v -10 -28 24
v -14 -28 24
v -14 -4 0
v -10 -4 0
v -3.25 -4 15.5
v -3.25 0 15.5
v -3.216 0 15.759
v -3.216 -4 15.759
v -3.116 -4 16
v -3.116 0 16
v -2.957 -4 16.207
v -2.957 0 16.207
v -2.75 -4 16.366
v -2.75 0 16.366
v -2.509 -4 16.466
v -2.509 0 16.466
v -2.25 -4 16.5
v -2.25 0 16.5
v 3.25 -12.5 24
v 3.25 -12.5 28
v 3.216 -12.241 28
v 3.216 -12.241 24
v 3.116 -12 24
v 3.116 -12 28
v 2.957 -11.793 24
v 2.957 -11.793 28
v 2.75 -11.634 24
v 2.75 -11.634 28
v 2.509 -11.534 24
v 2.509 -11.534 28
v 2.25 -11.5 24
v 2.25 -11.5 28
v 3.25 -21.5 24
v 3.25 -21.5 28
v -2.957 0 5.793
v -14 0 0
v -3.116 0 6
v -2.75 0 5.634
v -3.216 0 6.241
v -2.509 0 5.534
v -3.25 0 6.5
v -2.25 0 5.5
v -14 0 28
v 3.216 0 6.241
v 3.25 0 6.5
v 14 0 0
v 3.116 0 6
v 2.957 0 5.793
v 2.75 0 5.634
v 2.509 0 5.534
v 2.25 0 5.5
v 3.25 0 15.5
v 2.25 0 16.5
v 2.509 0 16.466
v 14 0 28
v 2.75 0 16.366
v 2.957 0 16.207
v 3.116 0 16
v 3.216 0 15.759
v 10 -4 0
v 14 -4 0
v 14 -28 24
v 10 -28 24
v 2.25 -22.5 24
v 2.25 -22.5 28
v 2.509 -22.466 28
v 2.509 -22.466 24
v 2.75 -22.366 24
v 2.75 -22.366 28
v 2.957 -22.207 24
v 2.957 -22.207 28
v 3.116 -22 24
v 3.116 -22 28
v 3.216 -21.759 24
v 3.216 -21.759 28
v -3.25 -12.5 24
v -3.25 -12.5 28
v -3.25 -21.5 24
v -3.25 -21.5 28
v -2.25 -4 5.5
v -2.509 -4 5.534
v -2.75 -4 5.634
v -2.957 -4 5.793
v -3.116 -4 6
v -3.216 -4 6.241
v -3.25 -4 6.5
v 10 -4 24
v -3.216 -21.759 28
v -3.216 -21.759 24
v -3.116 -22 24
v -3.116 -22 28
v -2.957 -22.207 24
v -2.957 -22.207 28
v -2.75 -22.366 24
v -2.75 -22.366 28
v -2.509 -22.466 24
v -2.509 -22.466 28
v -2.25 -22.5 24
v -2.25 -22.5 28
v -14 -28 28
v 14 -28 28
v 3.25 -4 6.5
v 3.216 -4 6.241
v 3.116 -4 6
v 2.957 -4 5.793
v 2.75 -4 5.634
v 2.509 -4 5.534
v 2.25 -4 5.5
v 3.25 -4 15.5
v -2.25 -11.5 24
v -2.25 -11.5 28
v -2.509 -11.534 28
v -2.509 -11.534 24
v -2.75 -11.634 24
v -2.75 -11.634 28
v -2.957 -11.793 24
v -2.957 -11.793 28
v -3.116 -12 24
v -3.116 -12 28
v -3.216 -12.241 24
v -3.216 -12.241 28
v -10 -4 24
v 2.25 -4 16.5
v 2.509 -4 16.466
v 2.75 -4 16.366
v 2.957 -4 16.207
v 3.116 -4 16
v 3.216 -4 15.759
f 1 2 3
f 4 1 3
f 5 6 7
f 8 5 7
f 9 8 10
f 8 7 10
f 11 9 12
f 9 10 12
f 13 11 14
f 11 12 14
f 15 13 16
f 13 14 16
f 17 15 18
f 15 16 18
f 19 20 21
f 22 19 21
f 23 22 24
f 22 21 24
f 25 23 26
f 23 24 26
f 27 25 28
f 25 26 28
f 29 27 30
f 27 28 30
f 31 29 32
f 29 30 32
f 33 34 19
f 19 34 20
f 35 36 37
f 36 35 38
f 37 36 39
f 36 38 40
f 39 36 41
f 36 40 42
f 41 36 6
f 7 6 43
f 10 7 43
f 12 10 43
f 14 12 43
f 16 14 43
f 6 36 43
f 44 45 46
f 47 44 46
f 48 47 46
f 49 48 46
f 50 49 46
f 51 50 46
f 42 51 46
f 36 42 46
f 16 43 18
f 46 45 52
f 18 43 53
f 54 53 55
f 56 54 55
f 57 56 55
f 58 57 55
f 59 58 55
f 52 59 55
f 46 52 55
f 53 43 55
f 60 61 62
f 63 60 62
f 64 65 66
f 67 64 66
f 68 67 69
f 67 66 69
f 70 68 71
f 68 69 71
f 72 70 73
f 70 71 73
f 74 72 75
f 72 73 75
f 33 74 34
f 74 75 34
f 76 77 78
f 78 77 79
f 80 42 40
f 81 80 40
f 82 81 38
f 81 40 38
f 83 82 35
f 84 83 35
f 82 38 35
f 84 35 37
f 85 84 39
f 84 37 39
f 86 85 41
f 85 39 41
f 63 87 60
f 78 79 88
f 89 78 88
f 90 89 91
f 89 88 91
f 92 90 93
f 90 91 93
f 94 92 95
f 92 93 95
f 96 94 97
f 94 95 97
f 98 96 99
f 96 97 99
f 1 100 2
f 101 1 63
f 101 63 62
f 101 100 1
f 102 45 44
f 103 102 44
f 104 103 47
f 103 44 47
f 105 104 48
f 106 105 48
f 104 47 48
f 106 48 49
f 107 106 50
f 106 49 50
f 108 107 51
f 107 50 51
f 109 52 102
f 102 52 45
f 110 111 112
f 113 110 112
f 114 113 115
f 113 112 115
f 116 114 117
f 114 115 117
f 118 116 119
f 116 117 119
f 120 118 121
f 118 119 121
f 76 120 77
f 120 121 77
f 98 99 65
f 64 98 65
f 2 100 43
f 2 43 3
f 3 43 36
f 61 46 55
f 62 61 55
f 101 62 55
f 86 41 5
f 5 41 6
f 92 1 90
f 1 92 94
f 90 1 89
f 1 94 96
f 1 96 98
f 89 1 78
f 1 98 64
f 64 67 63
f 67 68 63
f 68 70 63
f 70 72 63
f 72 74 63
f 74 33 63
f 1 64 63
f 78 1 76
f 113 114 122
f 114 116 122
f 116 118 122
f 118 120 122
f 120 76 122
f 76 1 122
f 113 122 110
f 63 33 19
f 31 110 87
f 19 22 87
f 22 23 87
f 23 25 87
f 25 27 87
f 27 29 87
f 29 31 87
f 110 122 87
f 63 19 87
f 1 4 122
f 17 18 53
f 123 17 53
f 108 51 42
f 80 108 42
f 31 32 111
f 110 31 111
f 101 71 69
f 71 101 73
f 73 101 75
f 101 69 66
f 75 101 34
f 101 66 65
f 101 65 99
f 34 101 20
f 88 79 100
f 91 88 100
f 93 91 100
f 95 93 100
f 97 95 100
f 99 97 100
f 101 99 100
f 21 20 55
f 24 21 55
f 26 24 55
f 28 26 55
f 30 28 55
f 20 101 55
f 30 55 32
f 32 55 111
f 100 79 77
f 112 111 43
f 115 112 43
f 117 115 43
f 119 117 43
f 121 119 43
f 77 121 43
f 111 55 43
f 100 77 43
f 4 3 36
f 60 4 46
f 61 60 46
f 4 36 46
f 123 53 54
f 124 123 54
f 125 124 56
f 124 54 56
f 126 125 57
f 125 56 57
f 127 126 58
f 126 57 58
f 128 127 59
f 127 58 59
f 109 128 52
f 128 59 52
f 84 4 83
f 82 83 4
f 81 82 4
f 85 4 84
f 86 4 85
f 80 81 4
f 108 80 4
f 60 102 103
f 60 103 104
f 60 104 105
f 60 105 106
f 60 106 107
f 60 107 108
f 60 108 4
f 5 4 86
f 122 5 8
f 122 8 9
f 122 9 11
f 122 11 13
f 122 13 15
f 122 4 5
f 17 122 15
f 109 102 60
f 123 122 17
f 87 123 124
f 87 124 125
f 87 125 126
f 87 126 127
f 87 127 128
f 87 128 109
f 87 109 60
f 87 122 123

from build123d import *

# Parameters (mm, degrees)
F1_DEPTH = 28
F2_DEPTH = 4
F4_DEPTH = 4
F6_DEPTH = 4
F7_DEPTH = 4
F9_DEPTH = 4


with BuildPart() as f1:
    # F0 (on Front) → F1 (new body)
    with BuildSketch(Plane.XZ):
        Polygon((10, 24), (10, 0), (14, 0), (14, 28), (-14, 28), (-14, 0), (-10, 0), (-10, 24), align=None)
    extrude(amount=F1_DEPTH)

    # F0 (on Front) → F2 (join)
    with BuildSketch(Plane.XZ):
        Polygon((-10, 0), (0, 0), (10, 0), (10, 24), (-10, 24), align=None)
        with BuildLine():
            Line((2.25, 5.5), (0, 5.5))
            Line((0, 5.5), (-2.25, 5.5))
            ThreePointArc((-2.25, 5.5), (-2.957107, 5.792893), (-3.25, 6.5))
            Line((-3.25, 6.5), (-3.25, 15.5))
            ThreePointArc((-3.25, 15.5), (-2.957107, 16.207107), (-2.25, 16.5))
            Line((-2.25, 16.5), (0, 16.5))
            Line((0, 16.5), (2.25, 16.5))
            ThreePointArc((2.25, 16.5), (2.957107, 16.207107), (3.25, 15.5))
            Line((3.25, 15.5), (3.25, 6.5))
            ThreePointArc((3.25, 6.5), (2.957107, 5.792893), (2.25, 5.5))
        make_face(mode=Mode.SUBTRACT)
    extrude(amount=F2_DEPTH)

    # F3 (on face) → F4 (cut)
    with BuildSketch(Plane.YZ.offset(14)):
        Polygon((-4, 0), (-28, 24), (-28, 0), align=None)
    extrude(amount=-F4_DEPTH, mode=Mode.SUBTRACT)

    # F5 (on face) → F6 (cut)
    with BuildSketch(Plane(origin=(-14, 0, 0), x_dir=(0, -1, 0), z_dir=(-1, 0, 0))):
        Polygon((28, 24), (4, 0), (28, 0), align=None)
    extrude(amount=-F6_DEPTH, mode=Mode.SUBTRACT)

    # F0 (on Front) → F7 (cut)
    with BuildSketch(Plane.XZ):
        with BuildLine():
            Line((-2.25, 5.5), (0, 5.5))
            Line((0, 5.5), (2.25, 5.5))
            ThreePointArc((2.25, 5.5), (2.957107, 5.792893), (3.25, 6.5))
            Line((3.25, 6.5), (3.25, 15.5))
            ThreePointArc((3.25, 15.5), (2.957107, 16.207107), (2.25, 16.5))
            Line((2.25, 16.5), (0, 16.5))
            Line((0, 16.5), (-2.25, 16.5))
            ThreePointArc((-2.25, 16.5), (-2.957107, 16.207107), (-3.25, 15.5))
            Line((-3.25, 15.5), (-3.25, 6.5))
            ThreePointArc((-3.25, 6.5), (-2.957107, 5.792893), (-2.25, 5.5))
        make_face()
    extrude(amount=F7_DEPTH, mode=Mode.SUBTRACT)

    # F8 (on face) → F9 (cut)
    with BuildSketch(Plane.XY.offset(28)):
        with BuildLine():
            Line((-3.25, -12.5), (-3.25, -21.5))
            ThreePointArc((-3.25, -21.5), (-2.957107, -22.207107), (-2.25, -22.5))
            Line((-2.25, -22.5), (2.25, -22.5))
            ThreePointArc((2.25, -22.5), (2.957107, -22.207107), (3.25, -21.5))
            Line((3.25, -21.5), (3.25, -12.5))
            ThreePointArc((3.25, -12.5), (2.957107, -11.792893), (2.25, -11.5))
            Line((2.25, -11.5), (-2.25, -11.5))
            ThreePointArc((-2.25, -11.5), (-2.957107, -11.792893), (-3.25, -12.5))
        make_face()
    extrude(amount=-F9_DEPTH, mode=Mode.SUBTRACT)


solid = f1.part
